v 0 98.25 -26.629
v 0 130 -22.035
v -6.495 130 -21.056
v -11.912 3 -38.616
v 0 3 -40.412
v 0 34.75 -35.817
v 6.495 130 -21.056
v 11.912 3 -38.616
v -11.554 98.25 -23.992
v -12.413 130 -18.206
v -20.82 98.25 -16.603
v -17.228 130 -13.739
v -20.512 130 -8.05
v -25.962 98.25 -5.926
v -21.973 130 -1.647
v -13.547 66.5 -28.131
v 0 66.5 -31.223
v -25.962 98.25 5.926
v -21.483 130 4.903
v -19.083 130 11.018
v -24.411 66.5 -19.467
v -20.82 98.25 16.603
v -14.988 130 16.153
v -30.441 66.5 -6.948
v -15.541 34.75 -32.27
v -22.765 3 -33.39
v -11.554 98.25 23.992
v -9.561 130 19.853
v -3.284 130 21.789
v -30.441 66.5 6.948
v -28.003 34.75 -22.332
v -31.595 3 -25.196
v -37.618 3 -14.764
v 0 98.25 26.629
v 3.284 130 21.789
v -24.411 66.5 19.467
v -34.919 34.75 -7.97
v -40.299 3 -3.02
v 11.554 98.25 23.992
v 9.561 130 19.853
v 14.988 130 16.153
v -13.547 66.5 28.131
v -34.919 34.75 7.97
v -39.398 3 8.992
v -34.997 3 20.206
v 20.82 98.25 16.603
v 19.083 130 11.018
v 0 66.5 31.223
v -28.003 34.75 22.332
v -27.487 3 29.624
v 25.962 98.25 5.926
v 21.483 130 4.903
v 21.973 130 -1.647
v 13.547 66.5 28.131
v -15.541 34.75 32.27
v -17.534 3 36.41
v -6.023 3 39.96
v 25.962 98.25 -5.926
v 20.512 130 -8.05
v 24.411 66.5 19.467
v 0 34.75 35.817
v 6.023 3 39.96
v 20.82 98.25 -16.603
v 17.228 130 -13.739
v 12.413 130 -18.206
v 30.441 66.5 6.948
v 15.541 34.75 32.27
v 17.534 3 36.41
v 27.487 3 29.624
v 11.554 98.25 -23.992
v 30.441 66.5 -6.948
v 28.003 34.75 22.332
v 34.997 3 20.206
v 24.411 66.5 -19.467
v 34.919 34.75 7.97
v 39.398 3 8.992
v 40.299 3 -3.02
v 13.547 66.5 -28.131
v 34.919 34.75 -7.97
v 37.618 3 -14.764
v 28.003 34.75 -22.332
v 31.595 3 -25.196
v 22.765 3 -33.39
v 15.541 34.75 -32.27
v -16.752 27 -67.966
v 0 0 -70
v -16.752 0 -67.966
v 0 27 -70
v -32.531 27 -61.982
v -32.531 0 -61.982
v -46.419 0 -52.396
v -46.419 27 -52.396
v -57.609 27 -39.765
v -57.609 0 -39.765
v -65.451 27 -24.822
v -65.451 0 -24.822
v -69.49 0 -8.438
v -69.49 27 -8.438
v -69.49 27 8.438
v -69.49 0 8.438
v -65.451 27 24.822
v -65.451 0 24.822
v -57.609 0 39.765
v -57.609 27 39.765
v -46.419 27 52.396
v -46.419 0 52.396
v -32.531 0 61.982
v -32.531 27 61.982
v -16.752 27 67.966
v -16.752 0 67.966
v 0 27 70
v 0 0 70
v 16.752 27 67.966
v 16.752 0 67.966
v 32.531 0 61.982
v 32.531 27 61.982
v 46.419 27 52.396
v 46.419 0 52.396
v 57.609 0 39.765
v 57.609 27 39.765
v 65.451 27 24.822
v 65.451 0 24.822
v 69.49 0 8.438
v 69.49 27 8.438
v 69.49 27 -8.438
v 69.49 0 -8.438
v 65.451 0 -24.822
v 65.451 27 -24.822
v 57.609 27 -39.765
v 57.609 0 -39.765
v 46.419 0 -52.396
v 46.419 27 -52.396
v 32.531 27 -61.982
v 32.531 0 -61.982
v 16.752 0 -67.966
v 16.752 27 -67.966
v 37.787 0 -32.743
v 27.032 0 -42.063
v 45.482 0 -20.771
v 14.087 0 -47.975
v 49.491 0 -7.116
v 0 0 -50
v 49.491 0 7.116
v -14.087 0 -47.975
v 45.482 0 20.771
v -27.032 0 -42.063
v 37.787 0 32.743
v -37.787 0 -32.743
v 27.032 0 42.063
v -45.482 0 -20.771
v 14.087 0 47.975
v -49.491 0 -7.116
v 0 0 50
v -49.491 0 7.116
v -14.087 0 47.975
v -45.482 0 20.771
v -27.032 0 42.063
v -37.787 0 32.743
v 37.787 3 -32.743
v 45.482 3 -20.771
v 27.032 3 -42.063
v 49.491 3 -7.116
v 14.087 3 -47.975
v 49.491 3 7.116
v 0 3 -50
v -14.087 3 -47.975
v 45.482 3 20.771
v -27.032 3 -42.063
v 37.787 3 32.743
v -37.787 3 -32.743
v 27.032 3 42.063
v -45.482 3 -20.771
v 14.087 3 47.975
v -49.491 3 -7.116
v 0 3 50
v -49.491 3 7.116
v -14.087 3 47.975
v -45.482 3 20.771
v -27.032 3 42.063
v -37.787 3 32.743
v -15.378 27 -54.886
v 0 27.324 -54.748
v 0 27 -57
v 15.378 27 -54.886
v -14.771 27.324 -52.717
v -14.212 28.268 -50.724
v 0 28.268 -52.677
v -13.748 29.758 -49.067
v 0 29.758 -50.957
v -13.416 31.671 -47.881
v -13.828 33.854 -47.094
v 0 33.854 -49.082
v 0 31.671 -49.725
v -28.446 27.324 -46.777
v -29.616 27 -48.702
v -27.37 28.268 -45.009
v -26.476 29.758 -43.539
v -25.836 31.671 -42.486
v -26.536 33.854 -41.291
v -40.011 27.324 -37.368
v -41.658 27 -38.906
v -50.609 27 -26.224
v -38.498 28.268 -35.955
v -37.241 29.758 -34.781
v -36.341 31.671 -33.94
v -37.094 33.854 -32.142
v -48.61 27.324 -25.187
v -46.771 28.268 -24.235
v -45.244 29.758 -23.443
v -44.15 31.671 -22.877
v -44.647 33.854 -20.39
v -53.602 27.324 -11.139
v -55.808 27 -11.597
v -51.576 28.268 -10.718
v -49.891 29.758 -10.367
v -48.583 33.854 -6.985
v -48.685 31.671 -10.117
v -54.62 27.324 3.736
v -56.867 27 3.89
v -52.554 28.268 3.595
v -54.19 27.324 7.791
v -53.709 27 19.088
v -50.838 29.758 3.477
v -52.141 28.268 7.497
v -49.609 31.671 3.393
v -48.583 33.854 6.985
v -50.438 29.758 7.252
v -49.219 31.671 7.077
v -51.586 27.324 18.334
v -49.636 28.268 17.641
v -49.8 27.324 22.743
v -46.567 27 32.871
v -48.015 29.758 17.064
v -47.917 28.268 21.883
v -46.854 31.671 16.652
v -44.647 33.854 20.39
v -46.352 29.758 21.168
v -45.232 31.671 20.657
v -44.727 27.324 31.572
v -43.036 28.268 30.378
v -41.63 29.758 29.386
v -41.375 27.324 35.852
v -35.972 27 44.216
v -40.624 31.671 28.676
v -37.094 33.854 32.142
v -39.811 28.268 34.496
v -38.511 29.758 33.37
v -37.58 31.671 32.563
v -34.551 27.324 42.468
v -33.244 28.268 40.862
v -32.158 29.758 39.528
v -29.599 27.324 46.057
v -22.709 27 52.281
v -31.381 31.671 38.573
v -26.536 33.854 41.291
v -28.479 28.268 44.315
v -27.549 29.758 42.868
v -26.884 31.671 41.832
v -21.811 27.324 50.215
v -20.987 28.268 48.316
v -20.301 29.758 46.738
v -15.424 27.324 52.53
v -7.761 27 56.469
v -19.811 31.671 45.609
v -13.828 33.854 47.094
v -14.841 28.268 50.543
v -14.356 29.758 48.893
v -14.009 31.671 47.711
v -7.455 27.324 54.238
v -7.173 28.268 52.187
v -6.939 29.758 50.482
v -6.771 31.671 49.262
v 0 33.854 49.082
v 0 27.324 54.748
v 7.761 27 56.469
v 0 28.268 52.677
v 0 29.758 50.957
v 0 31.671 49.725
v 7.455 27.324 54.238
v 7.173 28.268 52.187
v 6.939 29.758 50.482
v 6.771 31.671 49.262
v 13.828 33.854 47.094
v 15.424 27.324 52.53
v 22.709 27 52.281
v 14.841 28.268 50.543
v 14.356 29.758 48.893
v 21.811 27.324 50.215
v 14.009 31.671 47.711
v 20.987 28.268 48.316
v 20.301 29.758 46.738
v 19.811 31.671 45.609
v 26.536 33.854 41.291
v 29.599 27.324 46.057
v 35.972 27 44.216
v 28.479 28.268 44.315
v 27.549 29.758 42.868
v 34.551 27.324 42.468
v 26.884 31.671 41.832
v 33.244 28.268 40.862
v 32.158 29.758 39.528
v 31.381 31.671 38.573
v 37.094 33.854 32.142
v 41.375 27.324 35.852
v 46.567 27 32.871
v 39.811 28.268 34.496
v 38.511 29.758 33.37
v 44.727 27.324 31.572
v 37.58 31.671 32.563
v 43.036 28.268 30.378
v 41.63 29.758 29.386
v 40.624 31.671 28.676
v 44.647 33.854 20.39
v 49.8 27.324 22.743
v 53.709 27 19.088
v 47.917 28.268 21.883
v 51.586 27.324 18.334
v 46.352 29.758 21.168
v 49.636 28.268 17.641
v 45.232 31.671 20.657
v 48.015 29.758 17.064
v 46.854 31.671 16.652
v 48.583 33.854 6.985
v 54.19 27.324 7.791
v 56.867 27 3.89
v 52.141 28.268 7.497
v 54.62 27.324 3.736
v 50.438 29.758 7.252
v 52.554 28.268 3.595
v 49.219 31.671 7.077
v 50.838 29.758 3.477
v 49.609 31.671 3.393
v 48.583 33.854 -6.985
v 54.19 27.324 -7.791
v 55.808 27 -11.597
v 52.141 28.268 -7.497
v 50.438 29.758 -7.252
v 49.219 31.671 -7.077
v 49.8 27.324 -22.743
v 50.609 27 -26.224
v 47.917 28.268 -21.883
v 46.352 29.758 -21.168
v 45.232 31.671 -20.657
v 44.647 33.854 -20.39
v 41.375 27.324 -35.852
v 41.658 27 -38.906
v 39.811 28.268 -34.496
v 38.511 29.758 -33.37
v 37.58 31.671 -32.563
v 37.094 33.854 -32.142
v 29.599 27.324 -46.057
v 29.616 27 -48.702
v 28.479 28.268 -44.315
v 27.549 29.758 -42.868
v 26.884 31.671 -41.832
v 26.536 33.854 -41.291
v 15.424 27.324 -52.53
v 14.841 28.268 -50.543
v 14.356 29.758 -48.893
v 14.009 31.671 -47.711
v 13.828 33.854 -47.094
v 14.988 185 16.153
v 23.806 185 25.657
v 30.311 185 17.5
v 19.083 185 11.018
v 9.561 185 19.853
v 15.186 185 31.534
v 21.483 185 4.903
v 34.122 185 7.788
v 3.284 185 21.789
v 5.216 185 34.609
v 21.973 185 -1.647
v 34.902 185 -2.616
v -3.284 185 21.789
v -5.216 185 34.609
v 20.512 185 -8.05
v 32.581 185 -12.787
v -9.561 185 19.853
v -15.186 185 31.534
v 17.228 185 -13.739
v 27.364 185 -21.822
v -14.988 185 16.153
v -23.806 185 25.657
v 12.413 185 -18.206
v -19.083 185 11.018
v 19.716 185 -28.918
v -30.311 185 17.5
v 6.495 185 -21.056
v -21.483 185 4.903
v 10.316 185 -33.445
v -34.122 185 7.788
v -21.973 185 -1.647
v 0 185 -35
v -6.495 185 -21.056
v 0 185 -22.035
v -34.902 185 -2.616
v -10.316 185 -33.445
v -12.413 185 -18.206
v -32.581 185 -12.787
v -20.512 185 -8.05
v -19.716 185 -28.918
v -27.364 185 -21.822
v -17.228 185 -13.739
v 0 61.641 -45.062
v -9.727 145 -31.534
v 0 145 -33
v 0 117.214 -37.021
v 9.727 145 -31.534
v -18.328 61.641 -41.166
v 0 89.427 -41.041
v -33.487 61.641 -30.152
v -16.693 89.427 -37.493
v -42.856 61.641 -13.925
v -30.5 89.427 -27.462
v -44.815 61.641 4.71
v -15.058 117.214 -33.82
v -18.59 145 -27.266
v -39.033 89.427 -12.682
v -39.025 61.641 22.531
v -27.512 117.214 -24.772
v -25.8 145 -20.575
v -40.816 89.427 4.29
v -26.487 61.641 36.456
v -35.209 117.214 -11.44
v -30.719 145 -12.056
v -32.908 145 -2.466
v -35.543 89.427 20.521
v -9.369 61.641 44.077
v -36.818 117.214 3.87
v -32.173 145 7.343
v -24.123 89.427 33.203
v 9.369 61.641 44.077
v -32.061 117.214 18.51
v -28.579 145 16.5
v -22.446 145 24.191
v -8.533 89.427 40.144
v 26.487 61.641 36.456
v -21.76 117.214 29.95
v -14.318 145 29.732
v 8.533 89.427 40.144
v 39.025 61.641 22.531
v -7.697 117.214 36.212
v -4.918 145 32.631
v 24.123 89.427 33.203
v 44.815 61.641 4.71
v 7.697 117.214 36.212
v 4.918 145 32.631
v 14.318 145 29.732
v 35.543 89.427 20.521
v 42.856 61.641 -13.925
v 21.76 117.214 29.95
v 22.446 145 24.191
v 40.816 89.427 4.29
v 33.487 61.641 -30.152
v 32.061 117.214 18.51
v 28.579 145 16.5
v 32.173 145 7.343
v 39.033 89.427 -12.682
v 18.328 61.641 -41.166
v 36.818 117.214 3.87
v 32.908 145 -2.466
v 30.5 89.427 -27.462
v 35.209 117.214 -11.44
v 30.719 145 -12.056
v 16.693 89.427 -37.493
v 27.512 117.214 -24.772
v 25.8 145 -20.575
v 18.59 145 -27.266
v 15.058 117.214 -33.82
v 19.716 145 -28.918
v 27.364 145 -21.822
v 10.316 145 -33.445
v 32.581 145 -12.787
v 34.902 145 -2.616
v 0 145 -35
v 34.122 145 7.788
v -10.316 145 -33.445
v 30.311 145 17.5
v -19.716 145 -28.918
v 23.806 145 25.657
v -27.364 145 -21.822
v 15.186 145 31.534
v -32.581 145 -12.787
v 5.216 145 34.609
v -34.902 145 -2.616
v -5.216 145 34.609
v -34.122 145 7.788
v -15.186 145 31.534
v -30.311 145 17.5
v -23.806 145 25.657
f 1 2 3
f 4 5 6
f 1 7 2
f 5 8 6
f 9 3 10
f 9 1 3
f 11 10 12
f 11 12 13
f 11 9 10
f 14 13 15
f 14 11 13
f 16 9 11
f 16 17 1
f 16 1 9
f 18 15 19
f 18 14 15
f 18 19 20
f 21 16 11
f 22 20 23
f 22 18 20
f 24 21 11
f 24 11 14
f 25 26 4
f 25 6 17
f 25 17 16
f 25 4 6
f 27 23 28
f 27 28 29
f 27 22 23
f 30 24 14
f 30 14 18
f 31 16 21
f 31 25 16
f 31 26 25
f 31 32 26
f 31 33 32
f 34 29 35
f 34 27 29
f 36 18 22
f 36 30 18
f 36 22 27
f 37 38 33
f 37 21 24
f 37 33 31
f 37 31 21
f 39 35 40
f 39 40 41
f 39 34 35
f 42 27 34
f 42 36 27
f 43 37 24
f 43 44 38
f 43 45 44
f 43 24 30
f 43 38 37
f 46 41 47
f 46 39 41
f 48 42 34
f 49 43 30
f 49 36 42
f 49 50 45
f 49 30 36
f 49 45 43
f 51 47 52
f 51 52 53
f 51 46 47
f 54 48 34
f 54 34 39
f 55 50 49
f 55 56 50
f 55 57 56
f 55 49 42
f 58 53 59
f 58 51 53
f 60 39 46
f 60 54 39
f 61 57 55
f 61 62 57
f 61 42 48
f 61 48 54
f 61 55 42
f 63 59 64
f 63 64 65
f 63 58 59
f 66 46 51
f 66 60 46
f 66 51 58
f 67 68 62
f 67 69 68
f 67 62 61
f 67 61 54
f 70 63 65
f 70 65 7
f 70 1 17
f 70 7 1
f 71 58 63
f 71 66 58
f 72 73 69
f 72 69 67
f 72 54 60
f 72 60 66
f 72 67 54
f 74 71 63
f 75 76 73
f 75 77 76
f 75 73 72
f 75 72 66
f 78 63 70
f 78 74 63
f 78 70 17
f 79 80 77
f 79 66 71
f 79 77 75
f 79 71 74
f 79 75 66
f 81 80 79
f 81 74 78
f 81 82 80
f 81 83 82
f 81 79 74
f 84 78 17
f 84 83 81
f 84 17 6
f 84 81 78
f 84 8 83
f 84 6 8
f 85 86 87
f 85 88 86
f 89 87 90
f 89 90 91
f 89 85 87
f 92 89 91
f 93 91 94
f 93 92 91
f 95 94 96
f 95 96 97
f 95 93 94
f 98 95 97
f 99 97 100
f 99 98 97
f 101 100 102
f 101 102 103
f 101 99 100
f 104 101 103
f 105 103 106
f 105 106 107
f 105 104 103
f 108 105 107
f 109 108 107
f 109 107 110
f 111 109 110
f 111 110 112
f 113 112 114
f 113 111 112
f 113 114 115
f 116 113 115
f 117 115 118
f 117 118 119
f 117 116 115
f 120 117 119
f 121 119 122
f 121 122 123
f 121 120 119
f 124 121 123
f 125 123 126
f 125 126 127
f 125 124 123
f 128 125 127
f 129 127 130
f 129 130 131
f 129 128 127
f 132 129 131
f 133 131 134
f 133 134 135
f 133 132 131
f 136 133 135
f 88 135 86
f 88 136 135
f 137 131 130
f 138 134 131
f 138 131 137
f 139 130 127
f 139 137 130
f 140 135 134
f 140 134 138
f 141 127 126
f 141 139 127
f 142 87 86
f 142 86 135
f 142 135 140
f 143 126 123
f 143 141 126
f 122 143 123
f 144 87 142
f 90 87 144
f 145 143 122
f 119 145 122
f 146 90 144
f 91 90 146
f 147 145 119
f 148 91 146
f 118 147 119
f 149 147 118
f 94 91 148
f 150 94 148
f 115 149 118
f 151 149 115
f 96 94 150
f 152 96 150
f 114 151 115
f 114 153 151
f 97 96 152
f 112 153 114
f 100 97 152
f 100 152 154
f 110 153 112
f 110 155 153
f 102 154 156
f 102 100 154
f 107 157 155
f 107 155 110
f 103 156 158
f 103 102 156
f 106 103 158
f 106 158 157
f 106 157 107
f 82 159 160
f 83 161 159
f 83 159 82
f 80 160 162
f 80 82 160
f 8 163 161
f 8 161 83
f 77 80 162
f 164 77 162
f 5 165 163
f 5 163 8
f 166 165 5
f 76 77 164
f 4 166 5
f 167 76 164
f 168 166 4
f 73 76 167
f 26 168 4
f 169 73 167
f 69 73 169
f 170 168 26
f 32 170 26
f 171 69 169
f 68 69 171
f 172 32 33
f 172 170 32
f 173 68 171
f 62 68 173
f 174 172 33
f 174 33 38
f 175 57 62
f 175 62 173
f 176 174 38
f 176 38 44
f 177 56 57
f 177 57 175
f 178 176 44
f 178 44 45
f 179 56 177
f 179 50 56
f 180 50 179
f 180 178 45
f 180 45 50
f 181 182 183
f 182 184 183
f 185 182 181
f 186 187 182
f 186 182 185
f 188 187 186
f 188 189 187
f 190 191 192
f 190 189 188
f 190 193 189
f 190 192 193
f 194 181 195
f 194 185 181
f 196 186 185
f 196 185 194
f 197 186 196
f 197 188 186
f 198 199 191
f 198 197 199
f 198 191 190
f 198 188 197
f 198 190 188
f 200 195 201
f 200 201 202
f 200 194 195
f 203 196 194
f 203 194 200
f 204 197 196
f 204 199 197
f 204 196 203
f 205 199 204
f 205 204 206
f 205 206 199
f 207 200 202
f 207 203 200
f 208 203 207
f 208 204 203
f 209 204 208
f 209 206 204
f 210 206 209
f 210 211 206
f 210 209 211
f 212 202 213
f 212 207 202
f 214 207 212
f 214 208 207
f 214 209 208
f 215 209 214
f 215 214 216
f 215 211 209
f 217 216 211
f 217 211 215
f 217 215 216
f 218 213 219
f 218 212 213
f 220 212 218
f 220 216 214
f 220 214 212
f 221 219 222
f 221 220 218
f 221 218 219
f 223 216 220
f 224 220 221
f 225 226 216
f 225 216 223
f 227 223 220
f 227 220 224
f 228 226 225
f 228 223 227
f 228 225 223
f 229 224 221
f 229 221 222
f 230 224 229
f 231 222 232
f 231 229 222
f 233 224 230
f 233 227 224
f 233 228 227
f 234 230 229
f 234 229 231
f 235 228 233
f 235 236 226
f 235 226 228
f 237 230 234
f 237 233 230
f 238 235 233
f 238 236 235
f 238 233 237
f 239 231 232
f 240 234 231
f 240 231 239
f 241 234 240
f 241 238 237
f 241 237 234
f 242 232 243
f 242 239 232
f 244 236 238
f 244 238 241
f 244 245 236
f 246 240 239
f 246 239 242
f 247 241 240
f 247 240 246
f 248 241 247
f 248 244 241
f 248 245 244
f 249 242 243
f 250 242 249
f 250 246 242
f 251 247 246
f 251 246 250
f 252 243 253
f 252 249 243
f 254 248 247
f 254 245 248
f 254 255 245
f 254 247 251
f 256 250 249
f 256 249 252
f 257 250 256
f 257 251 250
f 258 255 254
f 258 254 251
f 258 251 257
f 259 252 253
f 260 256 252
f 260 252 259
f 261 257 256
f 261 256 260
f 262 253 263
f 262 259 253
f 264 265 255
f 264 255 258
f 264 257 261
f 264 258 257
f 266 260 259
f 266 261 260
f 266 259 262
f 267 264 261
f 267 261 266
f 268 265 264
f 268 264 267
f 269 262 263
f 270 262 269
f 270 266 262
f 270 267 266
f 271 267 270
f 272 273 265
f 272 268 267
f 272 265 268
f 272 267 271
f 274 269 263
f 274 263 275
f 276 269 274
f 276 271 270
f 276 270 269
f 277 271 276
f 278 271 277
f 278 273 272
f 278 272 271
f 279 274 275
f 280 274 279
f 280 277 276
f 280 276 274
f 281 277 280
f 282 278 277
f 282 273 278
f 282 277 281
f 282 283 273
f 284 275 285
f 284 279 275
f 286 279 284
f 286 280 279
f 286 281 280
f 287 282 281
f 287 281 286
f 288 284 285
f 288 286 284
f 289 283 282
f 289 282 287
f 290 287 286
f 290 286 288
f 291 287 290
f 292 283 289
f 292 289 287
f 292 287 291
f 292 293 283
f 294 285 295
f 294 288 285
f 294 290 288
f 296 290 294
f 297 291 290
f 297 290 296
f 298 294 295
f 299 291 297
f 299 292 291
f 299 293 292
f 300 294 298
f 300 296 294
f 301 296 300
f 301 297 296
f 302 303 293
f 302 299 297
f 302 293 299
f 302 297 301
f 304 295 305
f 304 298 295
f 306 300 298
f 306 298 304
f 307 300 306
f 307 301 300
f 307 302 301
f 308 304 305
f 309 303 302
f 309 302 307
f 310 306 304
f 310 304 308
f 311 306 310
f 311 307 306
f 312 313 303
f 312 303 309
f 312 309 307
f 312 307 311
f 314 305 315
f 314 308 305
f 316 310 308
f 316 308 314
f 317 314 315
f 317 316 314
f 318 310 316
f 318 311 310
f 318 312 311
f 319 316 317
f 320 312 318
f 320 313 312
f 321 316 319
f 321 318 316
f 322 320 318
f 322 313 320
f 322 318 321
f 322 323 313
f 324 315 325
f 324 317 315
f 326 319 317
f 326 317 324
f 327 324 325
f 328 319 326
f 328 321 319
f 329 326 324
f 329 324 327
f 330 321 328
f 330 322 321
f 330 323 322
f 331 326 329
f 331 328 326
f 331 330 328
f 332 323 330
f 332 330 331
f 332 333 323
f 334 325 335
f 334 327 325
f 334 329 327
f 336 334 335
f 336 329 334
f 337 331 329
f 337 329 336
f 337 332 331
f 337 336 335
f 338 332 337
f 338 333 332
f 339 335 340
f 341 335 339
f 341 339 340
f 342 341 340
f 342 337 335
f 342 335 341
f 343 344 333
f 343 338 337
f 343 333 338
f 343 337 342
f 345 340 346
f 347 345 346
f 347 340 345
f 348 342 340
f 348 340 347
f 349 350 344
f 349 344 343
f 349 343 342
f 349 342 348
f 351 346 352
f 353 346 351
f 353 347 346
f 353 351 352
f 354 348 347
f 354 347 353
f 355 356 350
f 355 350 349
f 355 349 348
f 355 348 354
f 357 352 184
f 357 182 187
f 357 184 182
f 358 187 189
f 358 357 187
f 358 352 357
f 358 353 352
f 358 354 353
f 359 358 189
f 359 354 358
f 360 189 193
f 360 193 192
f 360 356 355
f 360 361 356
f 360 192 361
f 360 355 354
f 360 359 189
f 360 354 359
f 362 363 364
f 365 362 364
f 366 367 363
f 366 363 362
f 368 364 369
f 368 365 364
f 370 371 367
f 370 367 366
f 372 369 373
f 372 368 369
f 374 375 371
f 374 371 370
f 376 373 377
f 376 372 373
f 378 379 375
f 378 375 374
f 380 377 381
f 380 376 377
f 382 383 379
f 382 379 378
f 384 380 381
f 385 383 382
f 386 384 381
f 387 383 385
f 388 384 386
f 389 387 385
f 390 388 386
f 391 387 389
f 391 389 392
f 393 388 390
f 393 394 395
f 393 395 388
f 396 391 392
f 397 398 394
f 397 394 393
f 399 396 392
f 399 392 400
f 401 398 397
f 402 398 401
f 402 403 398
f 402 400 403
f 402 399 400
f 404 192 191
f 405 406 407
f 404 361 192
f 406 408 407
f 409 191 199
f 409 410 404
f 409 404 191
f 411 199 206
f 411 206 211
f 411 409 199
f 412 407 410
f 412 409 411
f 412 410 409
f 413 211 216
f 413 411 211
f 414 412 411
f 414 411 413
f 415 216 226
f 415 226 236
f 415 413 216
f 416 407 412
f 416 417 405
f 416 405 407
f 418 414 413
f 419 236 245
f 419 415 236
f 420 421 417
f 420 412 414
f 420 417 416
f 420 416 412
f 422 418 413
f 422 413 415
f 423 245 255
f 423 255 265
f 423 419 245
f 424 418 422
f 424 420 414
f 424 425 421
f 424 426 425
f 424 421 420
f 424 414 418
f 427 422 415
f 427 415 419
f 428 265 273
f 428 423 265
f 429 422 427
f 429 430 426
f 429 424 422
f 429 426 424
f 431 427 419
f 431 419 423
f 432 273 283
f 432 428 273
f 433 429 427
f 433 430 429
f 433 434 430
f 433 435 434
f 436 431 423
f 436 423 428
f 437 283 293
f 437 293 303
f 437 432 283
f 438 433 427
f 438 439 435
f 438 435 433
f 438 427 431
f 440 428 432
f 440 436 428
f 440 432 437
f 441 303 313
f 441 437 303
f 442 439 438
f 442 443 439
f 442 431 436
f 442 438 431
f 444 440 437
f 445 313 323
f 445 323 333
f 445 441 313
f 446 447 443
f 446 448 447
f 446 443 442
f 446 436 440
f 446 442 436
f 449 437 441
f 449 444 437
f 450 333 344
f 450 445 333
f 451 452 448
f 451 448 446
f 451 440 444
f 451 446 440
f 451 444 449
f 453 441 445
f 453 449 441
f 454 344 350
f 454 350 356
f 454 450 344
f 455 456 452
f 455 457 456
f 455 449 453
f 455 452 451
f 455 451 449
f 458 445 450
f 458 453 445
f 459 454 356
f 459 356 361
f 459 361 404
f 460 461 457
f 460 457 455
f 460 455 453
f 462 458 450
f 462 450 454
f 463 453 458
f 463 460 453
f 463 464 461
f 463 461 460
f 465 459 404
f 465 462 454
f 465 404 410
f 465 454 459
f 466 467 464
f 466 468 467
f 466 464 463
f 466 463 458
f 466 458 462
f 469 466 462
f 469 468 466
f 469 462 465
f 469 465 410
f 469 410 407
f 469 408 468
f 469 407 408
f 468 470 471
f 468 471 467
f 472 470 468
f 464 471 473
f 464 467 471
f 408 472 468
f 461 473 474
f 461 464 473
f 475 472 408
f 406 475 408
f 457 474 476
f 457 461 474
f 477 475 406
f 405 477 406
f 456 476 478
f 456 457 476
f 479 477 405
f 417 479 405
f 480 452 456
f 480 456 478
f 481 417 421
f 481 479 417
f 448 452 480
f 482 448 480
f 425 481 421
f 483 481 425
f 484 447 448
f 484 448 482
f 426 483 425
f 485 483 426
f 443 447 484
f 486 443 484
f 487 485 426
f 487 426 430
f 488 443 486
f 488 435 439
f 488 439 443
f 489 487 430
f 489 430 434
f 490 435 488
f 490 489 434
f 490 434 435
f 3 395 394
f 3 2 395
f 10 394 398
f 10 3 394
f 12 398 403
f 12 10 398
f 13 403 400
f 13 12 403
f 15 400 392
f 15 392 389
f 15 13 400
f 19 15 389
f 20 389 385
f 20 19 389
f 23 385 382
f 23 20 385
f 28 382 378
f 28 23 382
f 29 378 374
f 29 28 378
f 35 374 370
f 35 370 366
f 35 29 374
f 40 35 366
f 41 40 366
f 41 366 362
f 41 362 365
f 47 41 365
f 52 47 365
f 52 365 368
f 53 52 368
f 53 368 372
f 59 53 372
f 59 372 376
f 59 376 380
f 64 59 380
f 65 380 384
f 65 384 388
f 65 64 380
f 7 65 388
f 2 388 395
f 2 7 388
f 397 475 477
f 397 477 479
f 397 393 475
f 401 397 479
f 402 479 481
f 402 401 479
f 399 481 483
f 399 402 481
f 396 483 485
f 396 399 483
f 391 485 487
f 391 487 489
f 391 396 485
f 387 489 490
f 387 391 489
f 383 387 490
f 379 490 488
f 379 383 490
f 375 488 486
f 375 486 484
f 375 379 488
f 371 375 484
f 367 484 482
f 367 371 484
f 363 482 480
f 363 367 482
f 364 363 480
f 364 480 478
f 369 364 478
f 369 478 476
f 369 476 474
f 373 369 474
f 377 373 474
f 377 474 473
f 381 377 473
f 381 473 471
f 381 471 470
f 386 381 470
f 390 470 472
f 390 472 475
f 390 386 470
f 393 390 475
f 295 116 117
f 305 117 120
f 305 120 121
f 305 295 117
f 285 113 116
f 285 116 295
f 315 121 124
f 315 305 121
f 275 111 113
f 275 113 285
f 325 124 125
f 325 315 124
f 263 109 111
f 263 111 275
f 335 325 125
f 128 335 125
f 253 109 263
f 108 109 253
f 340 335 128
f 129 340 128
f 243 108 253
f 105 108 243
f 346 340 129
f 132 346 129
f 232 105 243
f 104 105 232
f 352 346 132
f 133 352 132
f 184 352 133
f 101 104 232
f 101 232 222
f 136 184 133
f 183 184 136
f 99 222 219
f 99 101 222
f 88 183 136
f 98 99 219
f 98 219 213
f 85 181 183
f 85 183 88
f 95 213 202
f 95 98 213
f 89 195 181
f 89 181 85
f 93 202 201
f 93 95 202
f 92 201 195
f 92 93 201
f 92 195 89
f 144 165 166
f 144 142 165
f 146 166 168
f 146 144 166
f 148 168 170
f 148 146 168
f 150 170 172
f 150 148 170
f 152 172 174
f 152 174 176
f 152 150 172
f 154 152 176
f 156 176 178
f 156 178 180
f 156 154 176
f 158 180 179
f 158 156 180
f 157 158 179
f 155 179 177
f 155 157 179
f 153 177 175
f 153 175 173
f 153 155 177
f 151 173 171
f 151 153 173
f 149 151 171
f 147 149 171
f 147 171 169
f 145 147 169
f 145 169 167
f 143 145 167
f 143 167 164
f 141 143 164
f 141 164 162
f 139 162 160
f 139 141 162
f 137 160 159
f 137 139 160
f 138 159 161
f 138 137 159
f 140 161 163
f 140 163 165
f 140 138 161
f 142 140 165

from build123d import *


with BuildPart() as part:
    # Sketch1 → Revolve1 (revolve)
    with BuildSketch(Plane.XY, mode=Mode.PRIVATE) as revolve1_sk:
        with BuildLine():
            Line((-70, 0), (-70, 27))
            Line((-70, 27), (-57, 27))
            ThreePointArc((-57, 27), (-51.763835702, 28.95164622), (-49.082456469, 33.854354139))
            Line((-49.082456469, 33.854354139), (-33, 145))
            Line((-33, 145), (-35, 145))
            Line((-35, 145), (-35, 185))
            Line((-35, 185), (-22.035069811, 185))
            Line((-22.035069811, 185), (-22.035069811, 130))
            Line((-22.035069811, 130), (-40.411605894, 3))
            Line((-40.411605894, 3), (-50, 3))
            Line((-50, 3), (-50, 0))
            Line((-50, 0), (-70, 0))
        make_face()
    revolve(revolve1_sk.sketch.rotate(Axis((0, 0, 0), (0, 1, 0)), 270), axis=Axis((0, 0, 0), (0, 1, 0)))


solid = part.part
